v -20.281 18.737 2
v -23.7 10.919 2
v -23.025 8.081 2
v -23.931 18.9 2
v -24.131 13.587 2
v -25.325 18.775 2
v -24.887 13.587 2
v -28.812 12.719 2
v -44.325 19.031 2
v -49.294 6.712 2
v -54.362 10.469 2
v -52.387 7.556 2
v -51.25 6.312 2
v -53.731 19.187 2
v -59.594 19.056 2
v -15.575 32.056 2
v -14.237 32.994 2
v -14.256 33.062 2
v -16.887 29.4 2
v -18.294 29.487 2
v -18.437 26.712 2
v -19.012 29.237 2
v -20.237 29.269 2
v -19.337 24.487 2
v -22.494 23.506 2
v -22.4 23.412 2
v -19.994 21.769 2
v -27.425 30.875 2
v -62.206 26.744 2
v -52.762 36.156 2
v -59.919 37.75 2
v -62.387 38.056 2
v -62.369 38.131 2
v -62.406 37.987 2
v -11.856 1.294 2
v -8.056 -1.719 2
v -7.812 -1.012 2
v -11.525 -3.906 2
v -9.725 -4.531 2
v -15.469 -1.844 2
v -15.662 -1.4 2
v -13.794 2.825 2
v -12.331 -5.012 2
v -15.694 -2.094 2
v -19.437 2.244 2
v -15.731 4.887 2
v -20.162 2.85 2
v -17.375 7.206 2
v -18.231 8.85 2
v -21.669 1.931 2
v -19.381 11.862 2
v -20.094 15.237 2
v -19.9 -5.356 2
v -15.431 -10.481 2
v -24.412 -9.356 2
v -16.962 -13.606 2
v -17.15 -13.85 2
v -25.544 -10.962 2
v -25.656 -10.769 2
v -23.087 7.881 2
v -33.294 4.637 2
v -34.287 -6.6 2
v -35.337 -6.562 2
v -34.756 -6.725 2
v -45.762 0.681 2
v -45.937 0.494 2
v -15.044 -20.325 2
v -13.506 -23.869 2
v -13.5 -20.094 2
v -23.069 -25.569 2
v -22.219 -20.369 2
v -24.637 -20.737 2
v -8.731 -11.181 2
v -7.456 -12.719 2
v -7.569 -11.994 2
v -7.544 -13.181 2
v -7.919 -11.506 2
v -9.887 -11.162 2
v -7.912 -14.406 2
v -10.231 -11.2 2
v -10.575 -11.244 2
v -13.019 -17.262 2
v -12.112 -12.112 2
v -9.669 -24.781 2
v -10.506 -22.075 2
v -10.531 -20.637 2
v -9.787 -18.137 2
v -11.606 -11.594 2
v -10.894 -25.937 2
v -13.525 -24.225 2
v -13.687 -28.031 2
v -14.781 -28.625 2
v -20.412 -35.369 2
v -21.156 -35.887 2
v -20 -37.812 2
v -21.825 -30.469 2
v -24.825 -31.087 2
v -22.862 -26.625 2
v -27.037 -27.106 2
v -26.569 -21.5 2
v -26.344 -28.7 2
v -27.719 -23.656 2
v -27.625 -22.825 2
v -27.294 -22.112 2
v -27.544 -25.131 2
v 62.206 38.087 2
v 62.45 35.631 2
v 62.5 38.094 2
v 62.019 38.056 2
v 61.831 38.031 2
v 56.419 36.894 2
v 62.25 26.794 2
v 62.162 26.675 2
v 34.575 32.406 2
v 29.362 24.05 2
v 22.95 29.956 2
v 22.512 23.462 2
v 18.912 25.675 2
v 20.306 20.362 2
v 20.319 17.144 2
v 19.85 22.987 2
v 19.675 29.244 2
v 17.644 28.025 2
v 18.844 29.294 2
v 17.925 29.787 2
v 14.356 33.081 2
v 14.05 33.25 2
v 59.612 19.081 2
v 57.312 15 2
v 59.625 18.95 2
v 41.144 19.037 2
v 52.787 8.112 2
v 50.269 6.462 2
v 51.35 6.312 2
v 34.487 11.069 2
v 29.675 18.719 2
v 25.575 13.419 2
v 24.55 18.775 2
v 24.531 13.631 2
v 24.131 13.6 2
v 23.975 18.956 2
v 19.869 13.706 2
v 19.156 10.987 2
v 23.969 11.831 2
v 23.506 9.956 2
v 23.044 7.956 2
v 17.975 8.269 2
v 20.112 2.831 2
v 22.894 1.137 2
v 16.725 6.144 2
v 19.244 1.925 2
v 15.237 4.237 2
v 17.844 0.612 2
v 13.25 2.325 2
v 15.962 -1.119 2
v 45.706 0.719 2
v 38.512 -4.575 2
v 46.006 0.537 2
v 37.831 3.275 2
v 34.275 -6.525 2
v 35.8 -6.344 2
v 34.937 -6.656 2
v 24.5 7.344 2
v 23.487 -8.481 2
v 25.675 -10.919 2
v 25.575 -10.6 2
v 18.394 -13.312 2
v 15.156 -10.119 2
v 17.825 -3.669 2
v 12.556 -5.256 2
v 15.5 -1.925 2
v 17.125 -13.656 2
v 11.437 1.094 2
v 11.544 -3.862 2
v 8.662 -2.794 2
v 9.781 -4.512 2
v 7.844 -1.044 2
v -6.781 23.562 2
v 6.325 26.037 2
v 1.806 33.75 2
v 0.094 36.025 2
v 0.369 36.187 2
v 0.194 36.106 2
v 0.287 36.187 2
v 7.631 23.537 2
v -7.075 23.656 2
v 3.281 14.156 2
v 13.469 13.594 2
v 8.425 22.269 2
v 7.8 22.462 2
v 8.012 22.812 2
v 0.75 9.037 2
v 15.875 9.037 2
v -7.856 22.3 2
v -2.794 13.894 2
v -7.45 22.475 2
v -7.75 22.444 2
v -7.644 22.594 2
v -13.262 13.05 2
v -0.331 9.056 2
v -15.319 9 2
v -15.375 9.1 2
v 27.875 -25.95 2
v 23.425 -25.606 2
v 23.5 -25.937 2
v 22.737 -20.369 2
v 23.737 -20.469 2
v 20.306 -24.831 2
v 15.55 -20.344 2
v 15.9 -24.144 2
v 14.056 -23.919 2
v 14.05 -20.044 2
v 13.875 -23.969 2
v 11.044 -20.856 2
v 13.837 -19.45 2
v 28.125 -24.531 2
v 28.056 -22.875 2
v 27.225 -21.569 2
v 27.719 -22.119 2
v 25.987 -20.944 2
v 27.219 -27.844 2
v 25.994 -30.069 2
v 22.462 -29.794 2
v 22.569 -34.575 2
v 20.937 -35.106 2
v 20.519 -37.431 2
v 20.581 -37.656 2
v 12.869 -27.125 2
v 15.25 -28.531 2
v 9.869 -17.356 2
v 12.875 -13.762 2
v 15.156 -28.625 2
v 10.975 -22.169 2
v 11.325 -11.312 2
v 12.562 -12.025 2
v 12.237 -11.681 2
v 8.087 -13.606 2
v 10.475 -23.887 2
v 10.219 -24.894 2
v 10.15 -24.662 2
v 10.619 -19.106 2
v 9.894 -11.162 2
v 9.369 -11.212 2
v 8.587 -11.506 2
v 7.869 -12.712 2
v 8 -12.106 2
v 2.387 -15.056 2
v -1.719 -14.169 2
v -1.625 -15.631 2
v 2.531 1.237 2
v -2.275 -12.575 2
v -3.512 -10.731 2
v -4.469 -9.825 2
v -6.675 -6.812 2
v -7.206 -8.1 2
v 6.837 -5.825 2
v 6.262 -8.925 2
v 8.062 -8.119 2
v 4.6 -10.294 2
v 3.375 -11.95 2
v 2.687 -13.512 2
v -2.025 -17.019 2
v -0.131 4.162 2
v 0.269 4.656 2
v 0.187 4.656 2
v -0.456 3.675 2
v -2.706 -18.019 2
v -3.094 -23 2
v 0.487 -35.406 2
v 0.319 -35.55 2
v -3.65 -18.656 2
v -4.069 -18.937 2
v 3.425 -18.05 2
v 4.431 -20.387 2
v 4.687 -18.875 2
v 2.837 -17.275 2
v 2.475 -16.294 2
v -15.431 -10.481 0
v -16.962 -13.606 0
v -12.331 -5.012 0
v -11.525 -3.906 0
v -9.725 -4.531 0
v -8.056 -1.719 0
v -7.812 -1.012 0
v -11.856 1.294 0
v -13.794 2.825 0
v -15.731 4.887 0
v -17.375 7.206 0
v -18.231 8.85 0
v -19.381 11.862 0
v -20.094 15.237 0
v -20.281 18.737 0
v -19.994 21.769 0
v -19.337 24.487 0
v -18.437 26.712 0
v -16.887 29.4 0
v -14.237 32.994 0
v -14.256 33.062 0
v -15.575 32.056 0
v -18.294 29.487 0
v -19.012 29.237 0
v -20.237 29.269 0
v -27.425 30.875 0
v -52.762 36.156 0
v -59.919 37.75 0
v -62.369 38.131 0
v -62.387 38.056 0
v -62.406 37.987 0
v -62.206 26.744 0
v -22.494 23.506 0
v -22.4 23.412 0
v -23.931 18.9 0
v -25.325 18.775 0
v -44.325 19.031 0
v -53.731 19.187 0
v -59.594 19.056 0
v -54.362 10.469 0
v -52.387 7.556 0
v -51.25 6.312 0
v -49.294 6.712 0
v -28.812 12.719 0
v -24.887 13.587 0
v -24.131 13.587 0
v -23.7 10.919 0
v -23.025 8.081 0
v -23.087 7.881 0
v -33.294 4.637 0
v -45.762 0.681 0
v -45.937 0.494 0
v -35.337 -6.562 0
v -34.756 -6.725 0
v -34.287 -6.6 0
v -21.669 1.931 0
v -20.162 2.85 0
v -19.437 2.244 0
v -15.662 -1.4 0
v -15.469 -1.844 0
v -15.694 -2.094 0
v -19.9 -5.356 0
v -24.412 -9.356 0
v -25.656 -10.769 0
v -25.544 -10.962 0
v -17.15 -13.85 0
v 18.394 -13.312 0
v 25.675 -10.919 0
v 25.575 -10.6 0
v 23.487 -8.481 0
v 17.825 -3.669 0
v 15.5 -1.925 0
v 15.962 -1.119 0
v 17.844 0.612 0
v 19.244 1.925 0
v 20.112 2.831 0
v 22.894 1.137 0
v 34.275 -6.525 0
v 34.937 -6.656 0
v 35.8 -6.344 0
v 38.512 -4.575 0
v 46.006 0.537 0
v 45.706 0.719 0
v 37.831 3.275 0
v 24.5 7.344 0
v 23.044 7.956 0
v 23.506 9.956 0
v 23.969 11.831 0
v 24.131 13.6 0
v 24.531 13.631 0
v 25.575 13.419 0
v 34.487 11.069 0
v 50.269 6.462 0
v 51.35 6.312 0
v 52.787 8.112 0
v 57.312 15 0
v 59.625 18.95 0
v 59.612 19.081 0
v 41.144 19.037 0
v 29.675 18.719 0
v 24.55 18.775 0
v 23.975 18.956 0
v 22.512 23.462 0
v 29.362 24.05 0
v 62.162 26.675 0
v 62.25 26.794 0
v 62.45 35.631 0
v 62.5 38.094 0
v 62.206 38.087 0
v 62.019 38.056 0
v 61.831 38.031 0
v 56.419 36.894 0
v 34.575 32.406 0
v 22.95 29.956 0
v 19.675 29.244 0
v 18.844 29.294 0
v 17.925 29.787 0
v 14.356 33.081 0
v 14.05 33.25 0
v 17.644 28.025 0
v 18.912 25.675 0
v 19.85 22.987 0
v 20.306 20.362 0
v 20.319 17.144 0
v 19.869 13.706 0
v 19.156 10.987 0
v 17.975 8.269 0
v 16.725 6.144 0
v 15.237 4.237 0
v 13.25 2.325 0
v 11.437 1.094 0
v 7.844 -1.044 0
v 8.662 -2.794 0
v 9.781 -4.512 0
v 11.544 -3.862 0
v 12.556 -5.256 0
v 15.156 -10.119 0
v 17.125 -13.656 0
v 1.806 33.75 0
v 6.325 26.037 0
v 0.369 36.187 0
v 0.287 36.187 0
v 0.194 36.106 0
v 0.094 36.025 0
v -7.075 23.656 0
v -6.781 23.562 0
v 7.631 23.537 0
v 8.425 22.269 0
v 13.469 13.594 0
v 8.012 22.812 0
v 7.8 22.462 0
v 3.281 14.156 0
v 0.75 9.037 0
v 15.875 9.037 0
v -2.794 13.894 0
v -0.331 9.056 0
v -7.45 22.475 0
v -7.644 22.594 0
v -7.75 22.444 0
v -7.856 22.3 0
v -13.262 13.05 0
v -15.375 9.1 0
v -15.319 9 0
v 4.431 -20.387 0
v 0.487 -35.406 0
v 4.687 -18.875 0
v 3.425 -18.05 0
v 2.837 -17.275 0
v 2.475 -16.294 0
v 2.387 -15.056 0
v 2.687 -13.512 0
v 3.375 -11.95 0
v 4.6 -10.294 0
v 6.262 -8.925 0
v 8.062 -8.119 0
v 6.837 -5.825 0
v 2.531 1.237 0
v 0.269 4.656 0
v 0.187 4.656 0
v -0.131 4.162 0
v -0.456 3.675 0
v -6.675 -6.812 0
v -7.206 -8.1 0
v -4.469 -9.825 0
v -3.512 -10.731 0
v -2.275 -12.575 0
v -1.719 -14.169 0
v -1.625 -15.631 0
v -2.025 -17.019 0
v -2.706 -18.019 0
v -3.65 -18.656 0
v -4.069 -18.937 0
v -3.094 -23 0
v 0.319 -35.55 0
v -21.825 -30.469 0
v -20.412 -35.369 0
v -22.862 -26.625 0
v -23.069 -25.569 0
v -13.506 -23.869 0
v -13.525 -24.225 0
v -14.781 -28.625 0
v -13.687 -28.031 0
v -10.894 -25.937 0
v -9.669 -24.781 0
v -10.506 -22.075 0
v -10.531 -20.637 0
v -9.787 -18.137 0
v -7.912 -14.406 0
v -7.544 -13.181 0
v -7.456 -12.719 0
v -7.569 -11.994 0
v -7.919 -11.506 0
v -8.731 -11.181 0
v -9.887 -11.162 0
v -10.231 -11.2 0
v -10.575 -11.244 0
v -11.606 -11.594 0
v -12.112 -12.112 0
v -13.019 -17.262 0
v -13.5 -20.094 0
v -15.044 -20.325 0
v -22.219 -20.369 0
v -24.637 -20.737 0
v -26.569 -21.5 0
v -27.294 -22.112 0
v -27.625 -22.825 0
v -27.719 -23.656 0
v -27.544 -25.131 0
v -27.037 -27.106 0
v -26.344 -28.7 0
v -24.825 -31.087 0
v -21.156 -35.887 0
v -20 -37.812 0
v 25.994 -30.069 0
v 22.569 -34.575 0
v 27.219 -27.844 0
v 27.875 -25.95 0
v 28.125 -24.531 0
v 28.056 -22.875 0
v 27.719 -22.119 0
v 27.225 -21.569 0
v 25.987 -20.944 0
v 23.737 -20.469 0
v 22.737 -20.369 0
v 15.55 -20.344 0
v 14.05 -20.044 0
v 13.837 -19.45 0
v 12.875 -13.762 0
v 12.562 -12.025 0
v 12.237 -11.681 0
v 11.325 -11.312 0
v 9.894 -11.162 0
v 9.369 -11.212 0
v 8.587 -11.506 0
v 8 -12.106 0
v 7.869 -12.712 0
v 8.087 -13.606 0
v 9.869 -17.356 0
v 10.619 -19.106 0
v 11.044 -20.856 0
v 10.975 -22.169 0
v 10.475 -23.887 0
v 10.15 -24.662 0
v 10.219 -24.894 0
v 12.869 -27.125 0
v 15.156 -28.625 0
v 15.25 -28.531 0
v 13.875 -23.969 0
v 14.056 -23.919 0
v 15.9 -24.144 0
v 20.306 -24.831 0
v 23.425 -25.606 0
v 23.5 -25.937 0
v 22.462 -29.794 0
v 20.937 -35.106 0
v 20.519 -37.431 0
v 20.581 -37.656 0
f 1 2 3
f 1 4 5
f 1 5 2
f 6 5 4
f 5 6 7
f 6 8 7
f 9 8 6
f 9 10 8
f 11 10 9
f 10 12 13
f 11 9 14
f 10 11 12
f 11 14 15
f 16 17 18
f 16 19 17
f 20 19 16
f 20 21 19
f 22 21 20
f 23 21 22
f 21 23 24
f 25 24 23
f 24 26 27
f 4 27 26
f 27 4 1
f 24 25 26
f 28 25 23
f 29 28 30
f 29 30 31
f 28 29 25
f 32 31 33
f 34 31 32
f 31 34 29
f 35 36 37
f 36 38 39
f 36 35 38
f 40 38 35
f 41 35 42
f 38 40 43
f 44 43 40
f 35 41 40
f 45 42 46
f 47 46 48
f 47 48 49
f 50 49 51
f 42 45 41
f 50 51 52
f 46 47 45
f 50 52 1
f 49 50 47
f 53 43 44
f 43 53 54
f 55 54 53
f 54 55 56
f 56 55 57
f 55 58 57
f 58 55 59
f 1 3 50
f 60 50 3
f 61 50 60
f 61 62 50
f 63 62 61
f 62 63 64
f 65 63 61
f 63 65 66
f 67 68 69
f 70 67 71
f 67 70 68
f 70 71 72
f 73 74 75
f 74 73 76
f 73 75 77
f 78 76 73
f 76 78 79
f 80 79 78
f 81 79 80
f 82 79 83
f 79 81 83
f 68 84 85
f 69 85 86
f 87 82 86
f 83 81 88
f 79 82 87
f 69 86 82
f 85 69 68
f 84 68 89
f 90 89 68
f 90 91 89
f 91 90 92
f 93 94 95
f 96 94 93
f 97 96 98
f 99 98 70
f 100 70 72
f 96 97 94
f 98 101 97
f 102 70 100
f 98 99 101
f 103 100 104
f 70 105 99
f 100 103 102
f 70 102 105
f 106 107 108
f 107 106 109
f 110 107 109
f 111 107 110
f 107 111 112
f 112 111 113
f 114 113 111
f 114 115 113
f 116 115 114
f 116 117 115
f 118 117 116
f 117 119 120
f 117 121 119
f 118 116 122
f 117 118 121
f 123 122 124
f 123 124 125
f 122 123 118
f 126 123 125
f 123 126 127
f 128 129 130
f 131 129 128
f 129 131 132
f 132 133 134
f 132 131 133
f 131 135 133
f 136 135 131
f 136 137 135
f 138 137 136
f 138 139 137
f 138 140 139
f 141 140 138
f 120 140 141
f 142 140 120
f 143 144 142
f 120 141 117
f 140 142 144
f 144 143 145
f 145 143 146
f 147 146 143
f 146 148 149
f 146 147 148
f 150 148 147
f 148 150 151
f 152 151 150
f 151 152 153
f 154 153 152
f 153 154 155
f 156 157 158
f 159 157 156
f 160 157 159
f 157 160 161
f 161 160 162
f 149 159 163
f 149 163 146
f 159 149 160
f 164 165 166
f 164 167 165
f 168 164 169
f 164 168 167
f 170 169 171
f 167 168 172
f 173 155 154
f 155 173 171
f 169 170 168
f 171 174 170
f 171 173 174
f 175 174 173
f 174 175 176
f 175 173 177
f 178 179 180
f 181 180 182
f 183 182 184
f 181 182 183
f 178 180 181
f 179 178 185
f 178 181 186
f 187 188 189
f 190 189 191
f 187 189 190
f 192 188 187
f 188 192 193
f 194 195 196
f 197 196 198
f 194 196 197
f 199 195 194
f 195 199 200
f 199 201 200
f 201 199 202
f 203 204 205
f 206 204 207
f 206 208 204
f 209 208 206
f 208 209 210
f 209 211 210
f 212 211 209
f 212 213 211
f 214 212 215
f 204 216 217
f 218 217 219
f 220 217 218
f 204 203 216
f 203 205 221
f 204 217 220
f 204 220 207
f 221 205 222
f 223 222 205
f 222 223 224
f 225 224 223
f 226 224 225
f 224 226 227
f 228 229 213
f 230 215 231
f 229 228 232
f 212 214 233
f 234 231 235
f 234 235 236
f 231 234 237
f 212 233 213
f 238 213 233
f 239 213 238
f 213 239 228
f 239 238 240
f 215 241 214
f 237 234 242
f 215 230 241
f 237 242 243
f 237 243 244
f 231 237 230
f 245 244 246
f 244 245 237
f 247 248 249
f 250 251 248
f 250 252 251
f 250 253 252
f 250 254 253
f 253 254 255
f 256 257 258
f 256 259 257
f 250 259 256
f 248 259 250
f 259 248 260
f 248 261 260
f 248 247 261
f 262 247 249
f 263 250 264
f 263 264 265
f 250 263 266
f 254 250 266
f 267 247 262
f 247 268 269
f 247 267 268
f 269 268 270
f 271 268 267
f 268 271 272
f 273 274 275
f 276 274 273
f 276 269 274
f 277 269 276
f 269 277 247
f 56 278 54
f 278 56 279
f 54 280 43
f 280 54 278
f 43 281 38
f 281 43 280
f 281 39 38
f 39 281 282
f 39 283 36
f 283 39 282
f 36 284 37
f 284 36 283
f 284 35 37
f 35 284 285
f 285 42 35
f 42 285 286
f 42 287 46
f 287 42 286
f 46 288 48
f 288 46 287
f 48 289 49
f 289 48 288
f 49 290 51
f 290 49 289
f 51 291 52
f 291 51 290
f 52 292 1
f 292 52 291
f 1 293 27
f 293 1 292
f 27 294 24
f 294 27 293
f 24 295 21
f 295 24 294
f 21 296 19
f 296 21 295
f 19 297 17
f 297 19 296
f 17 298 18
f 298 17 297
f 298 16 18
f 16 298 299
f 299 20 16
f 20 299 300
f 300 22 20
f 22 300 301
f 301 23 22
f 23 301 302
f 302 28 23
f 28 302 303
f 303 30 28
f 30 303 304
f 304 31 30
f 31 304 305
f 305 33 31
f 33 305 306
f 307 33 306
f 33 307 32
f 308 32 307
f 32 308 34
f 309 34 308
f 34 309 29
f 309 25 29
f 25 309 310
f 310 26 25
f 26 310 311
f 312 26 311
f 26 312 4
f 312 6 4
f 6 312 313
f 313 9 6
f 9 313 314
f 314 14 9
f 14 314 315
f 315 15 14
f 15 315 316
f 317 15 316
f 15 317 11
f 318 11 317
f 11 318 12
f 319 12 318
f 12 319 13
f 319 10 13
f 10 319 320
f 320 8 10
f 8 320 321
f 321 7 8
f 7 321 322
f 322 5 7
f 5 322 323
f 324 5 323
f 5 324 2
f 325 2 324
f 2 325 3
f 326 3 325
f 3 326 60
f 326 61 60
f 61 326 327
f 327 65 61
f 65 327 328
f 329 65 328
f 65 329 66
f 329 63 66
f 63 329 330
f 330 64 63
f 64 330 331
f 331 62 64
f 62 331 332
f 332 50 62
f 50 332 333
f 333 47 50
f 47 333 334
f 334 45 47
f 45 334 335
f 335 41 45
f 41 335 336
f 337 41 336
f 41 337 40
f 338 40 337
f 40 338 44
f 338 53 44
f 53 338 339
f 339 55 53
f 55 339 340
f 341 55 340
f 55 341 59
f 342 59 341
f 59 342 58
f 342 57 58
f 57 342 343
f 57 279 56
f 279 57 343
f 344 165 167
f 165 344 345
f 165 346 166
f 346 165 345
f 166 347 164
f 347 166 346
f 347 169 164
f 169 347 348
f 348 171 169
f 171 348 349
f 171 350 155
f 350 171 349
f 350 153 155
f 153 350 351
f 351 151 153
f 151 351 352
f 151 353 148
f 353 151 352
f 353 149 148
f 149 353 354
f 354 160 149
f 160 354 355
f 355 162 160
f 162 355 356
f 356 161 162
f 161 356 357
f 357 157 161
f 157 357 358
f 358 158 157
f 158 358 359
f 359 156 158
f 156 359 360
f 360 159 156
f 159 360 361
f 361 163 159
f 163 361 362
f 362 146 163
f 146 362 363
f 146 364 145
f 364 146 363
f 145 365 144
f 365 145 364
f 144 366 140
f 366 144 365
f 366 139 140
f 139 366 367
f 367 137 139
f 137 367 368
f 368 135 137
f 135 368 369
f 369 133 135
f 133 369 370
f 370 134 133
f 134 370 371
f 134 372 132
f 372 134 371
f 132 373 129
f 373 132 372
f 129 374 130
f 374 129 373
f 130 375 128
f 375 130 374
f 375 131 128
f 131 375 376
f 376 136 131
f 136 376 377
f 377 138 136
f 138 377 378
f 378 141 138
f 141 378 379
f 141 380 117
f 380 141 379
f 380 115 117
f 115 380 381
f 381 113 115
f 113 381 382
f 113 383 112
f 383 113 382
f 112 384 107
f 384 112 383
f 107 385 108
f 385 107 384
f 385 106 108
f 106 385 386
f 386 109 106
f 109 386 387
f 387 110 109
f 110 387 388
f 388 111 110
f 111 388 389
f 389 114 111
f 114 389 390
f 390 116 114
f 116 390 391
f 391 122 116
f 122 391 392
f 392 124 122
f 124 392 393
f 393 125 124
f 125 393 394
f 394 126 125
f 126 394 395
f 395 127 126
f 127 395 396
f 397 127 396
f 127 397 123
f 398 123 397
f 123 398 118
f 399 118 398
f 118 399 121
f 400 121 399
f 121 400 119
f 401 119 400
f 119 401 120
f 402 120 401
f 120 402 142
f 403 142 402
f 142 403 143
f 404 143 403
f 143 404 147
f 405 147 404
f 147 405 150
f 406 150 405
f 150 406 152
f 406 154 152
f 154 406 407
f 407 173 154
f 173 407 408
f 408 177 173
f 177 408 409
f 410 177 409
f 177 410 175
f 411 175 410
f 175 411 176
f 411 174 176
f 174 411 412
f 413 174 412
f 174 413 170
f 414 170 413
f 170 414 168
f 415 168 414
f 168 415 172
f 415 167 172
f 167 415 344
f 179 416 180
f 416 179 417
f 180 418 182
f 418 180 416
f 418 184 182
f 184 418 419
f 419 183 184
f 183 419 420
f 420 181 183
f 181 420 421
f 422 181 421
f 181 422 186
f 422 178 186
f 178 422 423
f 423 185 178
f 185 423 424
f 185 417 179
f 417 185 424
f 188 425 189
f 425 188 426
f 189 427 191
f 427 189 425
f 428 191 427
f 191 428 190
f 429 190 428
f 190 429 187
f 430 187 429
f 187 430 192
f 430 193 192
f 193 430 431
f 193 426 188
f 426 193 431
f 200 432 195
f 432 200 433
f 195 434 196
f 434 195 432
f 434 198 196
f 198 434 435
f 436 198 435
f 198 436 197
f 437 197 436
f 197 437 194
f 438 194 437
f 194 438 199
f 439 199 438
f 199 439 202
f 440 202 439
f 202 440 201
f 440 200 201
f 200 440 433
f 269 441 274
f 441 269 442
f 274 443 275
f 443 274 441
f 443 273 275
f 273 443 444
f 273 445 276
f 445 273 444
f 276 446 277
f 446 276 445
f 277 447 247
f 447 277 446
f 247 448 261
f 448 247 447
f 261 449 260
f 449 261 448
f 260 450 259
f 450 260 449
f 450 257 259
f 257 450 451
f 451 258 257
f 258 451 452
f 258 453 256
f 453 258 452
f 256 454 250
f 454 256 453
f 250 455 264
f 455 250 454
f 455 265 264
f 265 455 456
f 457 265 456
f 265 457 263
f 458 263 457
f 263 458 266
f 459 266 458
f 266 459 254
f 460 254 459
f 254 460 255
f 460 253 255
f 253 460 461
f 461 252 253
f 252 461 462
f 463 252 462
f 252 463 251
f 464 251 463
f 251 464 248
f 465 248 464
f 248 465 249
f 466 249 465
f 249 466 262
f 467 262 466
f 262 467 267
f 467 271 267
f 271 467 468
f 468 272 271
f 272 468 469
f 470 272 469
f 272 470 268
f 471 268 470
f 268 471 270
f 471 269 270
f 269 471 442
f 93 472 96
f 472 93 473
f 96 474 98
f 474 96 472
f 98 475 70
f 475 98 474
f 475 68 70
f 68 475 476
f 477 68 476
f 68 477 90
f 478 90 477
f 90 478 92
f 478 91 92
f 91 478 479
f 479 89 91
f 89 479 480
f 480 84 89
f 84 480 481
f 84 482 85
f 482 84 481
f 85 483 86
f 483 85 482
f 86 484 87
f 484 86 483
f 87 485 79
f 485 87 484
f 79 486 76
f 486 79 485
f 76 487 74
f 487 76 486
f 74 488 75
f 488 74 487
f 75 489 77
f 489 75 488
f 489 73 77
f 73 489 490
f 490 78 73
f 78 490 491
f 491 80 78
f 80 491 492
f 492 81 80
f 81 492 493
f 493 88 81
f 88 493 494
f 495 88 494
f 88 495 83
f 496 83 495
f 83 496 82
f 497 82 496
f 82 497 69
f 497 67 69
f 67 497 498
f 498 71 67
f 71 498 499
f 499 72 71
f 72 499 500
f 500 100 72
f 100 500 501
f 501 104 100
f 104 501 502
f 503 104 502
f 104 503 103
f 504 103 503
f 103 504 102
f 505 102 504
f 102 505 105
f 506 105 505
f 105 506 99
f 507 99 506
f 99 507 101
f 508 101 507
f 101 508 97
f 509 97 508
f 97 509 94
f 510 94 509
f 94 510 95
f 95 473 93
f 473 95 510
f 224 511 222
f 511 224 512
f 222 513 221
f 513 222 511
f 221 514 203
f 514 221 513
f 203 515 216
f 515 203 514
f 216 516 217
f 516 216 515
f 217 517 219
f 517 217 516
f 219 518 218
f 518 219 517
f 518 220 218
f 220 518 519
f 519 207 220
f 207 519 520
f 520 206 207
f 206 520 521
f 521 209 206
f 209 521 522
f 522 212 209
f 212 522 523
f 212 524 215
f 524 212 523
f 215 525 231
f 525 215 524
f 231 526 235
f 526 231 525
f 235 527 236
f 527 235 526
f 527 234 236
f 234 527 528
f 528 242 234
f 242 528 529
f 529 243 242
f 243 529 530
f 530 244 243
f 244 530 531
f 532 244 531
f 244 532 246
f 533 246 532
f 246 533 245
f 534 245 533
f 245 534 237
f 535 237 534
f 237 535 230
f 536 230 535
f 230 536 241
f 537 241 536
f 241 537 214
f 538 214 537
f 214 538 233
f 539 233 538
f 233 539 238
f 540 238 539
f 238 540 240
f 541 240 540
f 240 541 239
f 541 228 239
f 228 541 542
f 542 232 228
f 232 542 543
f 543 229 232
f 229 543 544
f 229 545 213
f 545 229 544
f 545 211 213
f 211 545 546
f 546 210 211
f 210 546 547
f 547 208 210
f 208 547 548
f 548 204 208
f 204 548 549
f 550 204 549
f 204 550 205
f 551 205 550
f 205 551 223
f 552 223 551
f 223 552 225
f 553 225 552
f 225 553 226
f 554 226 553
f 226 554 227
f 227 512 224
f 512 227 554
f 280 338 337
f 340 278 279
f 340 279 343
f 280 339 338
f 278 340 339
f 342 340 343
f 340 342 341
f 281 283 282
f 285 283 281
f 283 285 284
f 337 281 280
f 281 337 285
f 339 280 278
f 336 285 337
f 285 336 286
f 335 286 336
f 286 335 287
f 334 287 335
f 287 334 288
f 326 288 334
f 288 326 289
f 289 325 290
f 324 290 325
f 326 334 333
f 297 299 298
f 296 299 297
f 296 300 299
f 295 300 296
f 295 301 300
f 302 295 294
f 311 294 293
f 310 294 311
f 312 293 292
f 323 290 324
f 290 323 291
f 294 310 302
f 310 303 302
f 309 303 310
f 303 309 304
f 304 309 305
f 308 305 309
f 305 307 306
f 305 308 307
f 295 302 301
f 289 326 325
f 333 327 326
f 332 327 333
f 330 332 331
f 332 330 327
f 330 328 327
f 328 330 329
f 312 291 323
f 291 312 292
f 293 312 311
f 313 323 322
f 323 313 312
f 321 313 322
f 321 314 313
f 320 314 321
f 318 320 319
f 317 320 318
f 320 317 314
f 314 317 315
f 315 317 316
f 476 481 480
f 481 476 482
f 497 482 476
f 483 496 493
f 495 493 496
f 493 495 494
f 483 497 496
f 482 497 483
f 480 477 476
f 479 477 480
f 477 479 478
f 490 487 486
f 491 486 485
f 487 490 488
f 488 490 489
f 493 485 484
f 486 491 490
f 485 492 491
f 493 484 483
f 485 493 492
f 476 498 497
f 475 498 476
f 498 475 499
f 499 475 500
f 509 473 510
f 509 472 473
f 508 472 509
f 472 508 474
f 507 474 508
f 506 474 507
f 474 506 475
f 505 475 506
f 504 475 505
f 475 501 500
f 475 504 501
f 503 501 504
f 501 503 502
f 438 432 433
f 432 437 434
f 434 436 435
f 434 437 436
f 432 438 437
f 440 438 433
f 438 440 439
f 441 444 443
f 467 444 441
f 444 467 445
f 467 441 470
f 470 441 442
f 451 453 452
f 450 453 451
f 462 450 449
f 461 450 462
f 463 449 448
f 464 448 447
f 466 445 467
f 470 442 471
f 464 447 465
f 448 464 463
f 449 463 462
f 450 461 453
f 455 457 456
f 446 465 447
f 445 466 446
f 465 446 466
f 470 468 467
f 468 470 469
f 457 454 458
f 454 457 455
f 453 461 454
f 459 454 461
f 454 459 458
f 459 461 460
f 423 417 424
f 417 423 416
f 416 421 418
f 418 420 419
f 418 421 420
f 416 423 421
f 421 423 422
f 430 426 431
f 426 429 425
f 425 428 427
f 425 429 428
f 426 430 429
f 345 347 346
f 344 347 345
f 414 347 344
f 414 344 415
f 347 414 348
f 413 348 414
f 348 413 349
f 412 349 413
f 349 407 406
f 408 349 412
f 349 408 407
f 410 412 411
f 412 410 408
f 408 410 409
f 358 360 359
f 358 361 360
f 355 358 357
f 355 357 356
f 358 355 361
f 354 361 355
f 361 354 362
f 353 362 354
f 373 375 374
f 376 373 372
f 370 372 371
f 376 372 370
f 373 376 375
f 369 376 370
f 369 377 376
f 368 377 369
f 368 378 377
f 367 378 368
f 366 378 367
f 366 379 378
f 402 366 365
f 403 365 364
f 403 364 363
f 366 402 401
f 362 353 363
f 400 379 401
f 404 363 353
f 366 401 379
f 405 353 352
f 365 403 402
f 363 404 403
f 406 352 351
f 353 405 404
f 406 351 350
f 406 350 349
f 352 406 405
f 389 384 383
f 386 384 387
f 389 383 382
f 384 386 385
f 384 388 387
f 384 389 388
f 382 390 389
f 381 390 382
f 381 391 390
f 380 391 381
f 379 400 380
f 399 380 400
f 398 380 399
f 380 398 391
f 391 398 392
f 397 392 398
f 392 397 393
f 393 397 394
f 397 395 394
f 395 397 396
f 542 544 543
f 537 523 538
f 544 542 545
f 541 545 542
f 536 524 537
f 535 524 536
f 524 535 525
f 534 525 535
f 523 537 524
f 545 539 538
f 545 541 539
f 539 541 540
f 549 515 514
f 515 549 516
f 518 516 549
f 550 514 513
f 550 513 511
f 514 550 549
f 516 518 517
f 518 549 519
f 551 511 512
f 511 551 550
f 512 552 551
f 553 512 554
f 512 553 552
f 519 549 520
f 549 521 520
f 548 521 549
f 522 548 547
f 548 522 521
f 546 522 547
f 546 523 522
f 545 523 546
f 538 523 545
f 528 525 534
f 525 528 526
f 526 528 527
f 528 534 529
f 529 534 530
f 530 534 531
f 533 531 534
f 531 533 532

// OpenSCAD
module cca82b7e623f83b7bf9245205e197fdb_1()
{
 /* Generated by trace2scad version 20150415
    http://aggregate.org/MAKE/TRACE2SCAD/
    Optimized model has 279/3844 original points
 */
 color([0.48, 0.48, 0.48])
 assign(minx=0) /* polygon minx=15 */
 assign(miny=0) /* polygon miny=75 */
 assign(maxx=20000) /* polygon maxx=20000 */
 assign(maxy=12250) /* polygon maxy=12226 */
 assign(dx=maxx-minx)
 assign(dy=maxy-miny)
 assign(maxd=((dx>dy)?dx:dy))
 scale([1/maxd, 1/maxd, 1])
 translate([-minx-dx/2, -miny-dy/2, 0])
 linear_extrude(height=1, convexity=279)
 union() {
  union() {
   polygon([[18,12214],[15,12203],[47,10404],[6401,9886],[6416,9871],[6171,9149],[5948,9129],[2908,9170],[1403,9195],[465,9174],[1302,7800],[1618,7334],[1800,7135],[2113,7199],[5390,8160],[6018,8299],[6139,8299],[6208,7872],[6316,7418],[6306,7386],[4673,6867],[2678,6234],[2650,6204],[4346,5075],[4439,5049],[4514,5069],[6533,6434],[6774,6581],[6890,6484],[7494,5901],[7525,5830],[7489,5790],[6816,5268],[6094,4628],[5895,4402],[5913,4371],[7256,3909],[7286,3948],[7531,4448],[8027,5323],[8156,5500],[8444,5400],[8711,5850],[8750,5963],[8103,6332],[7793,6577],[7483,6907],[7220,7278],[7083,7541],[6899,8023],[6785,8563],[6755,9123],[6801,9608],[6906,10043],[7050,10399],[7298,10829],[7722,11404],[7719,11415],[7508,11254],[7073,10843],[6958,10803],[6762,10808],[5612,11065],[1558,11910],[413,12165],[21,12226]], convexity=24);
   polygon([[19923,12214],[19893,12210],[19027,12028],[15532,11310],[13672,10918],[13148,10804],[13015,10812],[12868,10891],[12297,11418],[12248,11445],[12823,10609],[13026,10233],[13176,9803],[13249,9383],[13251,8868],[13179,8318],[13065,7883],[12876,7448],[12676,7108],[12438,6803],[12120,6497],[11830,6300],[11255,5958],[11386,5678],[11565,5403],[11847,5507],[12009,5284],[12425,4506],[12740,3940],[12943,3995],[14108,4378],[14092,4429],[13758,4768],[12852,5538],[12480,5817],[12554,5946],[12855,6223],[13079,6433],[13218,6578],[13663,6307],[15484,5081],[15590,5060],[15728,5110],[16162,5393],[17361,6211],[17313,6240],[16053,6649],[13920,7300],[13687,7398],[13761,7718],[13835,8018],[13861,8301],[13925,8306],[14092,8272],[15518,7896],[18043,7159],[18216,7135],[18446,7423],[19170,8525],[19540,9157],[19538,9178],[16583,9171],[14748,9120],[13928,9129],[13836,9158],[13602,9879],[14698,9973],[19946,10393],[19960,10412],[19992,11826],[20000,12220],[19953,12219]], convexity=23);
   polygon([[10031,11902],[10015,11889],[8868,9910],[8915,9895],[11221,9891],[11012,10291],[10289,11525],[10059,11915],[10046,11915]], convexity=5);
   polygon([[11265,9747],[11248,9719],[10525,8390],[10120,7571],[12540,7571],[12155,8300],[11348,9688],[11282,9775]], convexity=5);
   polygon([[8760,9716],[8743,9693],[7878,8213],[7540,7581],[7549,7565],[9947,7574],[9553,8348],[8808,9721],[8777,9740]], convexity=6);
   polygon([[9979,6791],[9927,6713],[8932,5035],[8847,4829],[9285,4553],[9438,4408],[9636,4113],[9725,3858],[9740,3624],[9676,3402],[9567,3242],[9416,3140],[9349,3095],[9505,2445],[10051,437],[10078,460],[10709,2863],[10750,3105],[10548,3237],[10454,3361],[10396,3518],[10382,3716],[10430,3963],[10540,4213],[10736,4478],[11002,4697],[11290,4826],[11094,5193],[10405,6323],[10043,6870],[10030,6870]], convexity=10);
   polygon([[8363,4333],[8308,4326],[8143,4270],[8062,4187],[7917,3363],[7840,2910],[7593,2873],[6445,2866],[6058,2807],[5749,2685],[5633,2587],[5580,2473],[5565,2340],[5593,2104],[5674,1788],[5785,1533],[6028,1151],[6615,383],[6800,75],[6734,466],[6508,1250],[6342,1865],[6309,2034],[7839,2306],[7836,2249],[7635,1545],[7810,1640],[8257,1975],[8453,2160],[8319,2593],[8315,2823],[8434,3223],[8734,3820],[8793,4016],[8807,4090],[8789,4206],[8733,4284],[8603,4336],[8418,4339]], convexity=11);
   polygon([[11541,4335],[11499,4331],[11374,4284],[11280,4188],[11259,4091],[11294,3948],[11579,3348],[11699,3068],[11767,2788],[11756,2578],[11676,2303],[11624,2179],[11635,2142],[12059,1785],[12425,1545],[12440,1560],[12220,2290],[12249,2298],[12544,2262],[13249,2152],[13748,2028],[13760,1975],[13594,1358],[13350,508],[13283,136],[13293,100],[13611,593],[14159,1314],[14355,1670],[14460,1973],[14500,2200],[14489,2465],[14435,2586],[14356,2674],[14158,2774],[13798,2850],[13638,2866],[12488,2870],[12248,2918],[12214,3013],[12060,3923],[12010,4201],[11958,4256],[11812,4315],[11583,4339]], convexity=14);
  }
 }
}

module cca82b7e623f83b7bf9245205e197fdb()
{
 /* all layers combined, scaled to within a 1mm cube */
 scale([1, 1, 1/1])
 difference() {
  union() {
   scale([1,1,2]) translate([0,0,-0.5]) cca82b7e623f83b7bf9245205e197fdb_1();
  }
  translate([0,0,-2]) cube([2,2,4],center=true);
 }
}

scale([125, 125, 2]) {
	cca82b7e623f83b7bf9245205e197fdb();
}
